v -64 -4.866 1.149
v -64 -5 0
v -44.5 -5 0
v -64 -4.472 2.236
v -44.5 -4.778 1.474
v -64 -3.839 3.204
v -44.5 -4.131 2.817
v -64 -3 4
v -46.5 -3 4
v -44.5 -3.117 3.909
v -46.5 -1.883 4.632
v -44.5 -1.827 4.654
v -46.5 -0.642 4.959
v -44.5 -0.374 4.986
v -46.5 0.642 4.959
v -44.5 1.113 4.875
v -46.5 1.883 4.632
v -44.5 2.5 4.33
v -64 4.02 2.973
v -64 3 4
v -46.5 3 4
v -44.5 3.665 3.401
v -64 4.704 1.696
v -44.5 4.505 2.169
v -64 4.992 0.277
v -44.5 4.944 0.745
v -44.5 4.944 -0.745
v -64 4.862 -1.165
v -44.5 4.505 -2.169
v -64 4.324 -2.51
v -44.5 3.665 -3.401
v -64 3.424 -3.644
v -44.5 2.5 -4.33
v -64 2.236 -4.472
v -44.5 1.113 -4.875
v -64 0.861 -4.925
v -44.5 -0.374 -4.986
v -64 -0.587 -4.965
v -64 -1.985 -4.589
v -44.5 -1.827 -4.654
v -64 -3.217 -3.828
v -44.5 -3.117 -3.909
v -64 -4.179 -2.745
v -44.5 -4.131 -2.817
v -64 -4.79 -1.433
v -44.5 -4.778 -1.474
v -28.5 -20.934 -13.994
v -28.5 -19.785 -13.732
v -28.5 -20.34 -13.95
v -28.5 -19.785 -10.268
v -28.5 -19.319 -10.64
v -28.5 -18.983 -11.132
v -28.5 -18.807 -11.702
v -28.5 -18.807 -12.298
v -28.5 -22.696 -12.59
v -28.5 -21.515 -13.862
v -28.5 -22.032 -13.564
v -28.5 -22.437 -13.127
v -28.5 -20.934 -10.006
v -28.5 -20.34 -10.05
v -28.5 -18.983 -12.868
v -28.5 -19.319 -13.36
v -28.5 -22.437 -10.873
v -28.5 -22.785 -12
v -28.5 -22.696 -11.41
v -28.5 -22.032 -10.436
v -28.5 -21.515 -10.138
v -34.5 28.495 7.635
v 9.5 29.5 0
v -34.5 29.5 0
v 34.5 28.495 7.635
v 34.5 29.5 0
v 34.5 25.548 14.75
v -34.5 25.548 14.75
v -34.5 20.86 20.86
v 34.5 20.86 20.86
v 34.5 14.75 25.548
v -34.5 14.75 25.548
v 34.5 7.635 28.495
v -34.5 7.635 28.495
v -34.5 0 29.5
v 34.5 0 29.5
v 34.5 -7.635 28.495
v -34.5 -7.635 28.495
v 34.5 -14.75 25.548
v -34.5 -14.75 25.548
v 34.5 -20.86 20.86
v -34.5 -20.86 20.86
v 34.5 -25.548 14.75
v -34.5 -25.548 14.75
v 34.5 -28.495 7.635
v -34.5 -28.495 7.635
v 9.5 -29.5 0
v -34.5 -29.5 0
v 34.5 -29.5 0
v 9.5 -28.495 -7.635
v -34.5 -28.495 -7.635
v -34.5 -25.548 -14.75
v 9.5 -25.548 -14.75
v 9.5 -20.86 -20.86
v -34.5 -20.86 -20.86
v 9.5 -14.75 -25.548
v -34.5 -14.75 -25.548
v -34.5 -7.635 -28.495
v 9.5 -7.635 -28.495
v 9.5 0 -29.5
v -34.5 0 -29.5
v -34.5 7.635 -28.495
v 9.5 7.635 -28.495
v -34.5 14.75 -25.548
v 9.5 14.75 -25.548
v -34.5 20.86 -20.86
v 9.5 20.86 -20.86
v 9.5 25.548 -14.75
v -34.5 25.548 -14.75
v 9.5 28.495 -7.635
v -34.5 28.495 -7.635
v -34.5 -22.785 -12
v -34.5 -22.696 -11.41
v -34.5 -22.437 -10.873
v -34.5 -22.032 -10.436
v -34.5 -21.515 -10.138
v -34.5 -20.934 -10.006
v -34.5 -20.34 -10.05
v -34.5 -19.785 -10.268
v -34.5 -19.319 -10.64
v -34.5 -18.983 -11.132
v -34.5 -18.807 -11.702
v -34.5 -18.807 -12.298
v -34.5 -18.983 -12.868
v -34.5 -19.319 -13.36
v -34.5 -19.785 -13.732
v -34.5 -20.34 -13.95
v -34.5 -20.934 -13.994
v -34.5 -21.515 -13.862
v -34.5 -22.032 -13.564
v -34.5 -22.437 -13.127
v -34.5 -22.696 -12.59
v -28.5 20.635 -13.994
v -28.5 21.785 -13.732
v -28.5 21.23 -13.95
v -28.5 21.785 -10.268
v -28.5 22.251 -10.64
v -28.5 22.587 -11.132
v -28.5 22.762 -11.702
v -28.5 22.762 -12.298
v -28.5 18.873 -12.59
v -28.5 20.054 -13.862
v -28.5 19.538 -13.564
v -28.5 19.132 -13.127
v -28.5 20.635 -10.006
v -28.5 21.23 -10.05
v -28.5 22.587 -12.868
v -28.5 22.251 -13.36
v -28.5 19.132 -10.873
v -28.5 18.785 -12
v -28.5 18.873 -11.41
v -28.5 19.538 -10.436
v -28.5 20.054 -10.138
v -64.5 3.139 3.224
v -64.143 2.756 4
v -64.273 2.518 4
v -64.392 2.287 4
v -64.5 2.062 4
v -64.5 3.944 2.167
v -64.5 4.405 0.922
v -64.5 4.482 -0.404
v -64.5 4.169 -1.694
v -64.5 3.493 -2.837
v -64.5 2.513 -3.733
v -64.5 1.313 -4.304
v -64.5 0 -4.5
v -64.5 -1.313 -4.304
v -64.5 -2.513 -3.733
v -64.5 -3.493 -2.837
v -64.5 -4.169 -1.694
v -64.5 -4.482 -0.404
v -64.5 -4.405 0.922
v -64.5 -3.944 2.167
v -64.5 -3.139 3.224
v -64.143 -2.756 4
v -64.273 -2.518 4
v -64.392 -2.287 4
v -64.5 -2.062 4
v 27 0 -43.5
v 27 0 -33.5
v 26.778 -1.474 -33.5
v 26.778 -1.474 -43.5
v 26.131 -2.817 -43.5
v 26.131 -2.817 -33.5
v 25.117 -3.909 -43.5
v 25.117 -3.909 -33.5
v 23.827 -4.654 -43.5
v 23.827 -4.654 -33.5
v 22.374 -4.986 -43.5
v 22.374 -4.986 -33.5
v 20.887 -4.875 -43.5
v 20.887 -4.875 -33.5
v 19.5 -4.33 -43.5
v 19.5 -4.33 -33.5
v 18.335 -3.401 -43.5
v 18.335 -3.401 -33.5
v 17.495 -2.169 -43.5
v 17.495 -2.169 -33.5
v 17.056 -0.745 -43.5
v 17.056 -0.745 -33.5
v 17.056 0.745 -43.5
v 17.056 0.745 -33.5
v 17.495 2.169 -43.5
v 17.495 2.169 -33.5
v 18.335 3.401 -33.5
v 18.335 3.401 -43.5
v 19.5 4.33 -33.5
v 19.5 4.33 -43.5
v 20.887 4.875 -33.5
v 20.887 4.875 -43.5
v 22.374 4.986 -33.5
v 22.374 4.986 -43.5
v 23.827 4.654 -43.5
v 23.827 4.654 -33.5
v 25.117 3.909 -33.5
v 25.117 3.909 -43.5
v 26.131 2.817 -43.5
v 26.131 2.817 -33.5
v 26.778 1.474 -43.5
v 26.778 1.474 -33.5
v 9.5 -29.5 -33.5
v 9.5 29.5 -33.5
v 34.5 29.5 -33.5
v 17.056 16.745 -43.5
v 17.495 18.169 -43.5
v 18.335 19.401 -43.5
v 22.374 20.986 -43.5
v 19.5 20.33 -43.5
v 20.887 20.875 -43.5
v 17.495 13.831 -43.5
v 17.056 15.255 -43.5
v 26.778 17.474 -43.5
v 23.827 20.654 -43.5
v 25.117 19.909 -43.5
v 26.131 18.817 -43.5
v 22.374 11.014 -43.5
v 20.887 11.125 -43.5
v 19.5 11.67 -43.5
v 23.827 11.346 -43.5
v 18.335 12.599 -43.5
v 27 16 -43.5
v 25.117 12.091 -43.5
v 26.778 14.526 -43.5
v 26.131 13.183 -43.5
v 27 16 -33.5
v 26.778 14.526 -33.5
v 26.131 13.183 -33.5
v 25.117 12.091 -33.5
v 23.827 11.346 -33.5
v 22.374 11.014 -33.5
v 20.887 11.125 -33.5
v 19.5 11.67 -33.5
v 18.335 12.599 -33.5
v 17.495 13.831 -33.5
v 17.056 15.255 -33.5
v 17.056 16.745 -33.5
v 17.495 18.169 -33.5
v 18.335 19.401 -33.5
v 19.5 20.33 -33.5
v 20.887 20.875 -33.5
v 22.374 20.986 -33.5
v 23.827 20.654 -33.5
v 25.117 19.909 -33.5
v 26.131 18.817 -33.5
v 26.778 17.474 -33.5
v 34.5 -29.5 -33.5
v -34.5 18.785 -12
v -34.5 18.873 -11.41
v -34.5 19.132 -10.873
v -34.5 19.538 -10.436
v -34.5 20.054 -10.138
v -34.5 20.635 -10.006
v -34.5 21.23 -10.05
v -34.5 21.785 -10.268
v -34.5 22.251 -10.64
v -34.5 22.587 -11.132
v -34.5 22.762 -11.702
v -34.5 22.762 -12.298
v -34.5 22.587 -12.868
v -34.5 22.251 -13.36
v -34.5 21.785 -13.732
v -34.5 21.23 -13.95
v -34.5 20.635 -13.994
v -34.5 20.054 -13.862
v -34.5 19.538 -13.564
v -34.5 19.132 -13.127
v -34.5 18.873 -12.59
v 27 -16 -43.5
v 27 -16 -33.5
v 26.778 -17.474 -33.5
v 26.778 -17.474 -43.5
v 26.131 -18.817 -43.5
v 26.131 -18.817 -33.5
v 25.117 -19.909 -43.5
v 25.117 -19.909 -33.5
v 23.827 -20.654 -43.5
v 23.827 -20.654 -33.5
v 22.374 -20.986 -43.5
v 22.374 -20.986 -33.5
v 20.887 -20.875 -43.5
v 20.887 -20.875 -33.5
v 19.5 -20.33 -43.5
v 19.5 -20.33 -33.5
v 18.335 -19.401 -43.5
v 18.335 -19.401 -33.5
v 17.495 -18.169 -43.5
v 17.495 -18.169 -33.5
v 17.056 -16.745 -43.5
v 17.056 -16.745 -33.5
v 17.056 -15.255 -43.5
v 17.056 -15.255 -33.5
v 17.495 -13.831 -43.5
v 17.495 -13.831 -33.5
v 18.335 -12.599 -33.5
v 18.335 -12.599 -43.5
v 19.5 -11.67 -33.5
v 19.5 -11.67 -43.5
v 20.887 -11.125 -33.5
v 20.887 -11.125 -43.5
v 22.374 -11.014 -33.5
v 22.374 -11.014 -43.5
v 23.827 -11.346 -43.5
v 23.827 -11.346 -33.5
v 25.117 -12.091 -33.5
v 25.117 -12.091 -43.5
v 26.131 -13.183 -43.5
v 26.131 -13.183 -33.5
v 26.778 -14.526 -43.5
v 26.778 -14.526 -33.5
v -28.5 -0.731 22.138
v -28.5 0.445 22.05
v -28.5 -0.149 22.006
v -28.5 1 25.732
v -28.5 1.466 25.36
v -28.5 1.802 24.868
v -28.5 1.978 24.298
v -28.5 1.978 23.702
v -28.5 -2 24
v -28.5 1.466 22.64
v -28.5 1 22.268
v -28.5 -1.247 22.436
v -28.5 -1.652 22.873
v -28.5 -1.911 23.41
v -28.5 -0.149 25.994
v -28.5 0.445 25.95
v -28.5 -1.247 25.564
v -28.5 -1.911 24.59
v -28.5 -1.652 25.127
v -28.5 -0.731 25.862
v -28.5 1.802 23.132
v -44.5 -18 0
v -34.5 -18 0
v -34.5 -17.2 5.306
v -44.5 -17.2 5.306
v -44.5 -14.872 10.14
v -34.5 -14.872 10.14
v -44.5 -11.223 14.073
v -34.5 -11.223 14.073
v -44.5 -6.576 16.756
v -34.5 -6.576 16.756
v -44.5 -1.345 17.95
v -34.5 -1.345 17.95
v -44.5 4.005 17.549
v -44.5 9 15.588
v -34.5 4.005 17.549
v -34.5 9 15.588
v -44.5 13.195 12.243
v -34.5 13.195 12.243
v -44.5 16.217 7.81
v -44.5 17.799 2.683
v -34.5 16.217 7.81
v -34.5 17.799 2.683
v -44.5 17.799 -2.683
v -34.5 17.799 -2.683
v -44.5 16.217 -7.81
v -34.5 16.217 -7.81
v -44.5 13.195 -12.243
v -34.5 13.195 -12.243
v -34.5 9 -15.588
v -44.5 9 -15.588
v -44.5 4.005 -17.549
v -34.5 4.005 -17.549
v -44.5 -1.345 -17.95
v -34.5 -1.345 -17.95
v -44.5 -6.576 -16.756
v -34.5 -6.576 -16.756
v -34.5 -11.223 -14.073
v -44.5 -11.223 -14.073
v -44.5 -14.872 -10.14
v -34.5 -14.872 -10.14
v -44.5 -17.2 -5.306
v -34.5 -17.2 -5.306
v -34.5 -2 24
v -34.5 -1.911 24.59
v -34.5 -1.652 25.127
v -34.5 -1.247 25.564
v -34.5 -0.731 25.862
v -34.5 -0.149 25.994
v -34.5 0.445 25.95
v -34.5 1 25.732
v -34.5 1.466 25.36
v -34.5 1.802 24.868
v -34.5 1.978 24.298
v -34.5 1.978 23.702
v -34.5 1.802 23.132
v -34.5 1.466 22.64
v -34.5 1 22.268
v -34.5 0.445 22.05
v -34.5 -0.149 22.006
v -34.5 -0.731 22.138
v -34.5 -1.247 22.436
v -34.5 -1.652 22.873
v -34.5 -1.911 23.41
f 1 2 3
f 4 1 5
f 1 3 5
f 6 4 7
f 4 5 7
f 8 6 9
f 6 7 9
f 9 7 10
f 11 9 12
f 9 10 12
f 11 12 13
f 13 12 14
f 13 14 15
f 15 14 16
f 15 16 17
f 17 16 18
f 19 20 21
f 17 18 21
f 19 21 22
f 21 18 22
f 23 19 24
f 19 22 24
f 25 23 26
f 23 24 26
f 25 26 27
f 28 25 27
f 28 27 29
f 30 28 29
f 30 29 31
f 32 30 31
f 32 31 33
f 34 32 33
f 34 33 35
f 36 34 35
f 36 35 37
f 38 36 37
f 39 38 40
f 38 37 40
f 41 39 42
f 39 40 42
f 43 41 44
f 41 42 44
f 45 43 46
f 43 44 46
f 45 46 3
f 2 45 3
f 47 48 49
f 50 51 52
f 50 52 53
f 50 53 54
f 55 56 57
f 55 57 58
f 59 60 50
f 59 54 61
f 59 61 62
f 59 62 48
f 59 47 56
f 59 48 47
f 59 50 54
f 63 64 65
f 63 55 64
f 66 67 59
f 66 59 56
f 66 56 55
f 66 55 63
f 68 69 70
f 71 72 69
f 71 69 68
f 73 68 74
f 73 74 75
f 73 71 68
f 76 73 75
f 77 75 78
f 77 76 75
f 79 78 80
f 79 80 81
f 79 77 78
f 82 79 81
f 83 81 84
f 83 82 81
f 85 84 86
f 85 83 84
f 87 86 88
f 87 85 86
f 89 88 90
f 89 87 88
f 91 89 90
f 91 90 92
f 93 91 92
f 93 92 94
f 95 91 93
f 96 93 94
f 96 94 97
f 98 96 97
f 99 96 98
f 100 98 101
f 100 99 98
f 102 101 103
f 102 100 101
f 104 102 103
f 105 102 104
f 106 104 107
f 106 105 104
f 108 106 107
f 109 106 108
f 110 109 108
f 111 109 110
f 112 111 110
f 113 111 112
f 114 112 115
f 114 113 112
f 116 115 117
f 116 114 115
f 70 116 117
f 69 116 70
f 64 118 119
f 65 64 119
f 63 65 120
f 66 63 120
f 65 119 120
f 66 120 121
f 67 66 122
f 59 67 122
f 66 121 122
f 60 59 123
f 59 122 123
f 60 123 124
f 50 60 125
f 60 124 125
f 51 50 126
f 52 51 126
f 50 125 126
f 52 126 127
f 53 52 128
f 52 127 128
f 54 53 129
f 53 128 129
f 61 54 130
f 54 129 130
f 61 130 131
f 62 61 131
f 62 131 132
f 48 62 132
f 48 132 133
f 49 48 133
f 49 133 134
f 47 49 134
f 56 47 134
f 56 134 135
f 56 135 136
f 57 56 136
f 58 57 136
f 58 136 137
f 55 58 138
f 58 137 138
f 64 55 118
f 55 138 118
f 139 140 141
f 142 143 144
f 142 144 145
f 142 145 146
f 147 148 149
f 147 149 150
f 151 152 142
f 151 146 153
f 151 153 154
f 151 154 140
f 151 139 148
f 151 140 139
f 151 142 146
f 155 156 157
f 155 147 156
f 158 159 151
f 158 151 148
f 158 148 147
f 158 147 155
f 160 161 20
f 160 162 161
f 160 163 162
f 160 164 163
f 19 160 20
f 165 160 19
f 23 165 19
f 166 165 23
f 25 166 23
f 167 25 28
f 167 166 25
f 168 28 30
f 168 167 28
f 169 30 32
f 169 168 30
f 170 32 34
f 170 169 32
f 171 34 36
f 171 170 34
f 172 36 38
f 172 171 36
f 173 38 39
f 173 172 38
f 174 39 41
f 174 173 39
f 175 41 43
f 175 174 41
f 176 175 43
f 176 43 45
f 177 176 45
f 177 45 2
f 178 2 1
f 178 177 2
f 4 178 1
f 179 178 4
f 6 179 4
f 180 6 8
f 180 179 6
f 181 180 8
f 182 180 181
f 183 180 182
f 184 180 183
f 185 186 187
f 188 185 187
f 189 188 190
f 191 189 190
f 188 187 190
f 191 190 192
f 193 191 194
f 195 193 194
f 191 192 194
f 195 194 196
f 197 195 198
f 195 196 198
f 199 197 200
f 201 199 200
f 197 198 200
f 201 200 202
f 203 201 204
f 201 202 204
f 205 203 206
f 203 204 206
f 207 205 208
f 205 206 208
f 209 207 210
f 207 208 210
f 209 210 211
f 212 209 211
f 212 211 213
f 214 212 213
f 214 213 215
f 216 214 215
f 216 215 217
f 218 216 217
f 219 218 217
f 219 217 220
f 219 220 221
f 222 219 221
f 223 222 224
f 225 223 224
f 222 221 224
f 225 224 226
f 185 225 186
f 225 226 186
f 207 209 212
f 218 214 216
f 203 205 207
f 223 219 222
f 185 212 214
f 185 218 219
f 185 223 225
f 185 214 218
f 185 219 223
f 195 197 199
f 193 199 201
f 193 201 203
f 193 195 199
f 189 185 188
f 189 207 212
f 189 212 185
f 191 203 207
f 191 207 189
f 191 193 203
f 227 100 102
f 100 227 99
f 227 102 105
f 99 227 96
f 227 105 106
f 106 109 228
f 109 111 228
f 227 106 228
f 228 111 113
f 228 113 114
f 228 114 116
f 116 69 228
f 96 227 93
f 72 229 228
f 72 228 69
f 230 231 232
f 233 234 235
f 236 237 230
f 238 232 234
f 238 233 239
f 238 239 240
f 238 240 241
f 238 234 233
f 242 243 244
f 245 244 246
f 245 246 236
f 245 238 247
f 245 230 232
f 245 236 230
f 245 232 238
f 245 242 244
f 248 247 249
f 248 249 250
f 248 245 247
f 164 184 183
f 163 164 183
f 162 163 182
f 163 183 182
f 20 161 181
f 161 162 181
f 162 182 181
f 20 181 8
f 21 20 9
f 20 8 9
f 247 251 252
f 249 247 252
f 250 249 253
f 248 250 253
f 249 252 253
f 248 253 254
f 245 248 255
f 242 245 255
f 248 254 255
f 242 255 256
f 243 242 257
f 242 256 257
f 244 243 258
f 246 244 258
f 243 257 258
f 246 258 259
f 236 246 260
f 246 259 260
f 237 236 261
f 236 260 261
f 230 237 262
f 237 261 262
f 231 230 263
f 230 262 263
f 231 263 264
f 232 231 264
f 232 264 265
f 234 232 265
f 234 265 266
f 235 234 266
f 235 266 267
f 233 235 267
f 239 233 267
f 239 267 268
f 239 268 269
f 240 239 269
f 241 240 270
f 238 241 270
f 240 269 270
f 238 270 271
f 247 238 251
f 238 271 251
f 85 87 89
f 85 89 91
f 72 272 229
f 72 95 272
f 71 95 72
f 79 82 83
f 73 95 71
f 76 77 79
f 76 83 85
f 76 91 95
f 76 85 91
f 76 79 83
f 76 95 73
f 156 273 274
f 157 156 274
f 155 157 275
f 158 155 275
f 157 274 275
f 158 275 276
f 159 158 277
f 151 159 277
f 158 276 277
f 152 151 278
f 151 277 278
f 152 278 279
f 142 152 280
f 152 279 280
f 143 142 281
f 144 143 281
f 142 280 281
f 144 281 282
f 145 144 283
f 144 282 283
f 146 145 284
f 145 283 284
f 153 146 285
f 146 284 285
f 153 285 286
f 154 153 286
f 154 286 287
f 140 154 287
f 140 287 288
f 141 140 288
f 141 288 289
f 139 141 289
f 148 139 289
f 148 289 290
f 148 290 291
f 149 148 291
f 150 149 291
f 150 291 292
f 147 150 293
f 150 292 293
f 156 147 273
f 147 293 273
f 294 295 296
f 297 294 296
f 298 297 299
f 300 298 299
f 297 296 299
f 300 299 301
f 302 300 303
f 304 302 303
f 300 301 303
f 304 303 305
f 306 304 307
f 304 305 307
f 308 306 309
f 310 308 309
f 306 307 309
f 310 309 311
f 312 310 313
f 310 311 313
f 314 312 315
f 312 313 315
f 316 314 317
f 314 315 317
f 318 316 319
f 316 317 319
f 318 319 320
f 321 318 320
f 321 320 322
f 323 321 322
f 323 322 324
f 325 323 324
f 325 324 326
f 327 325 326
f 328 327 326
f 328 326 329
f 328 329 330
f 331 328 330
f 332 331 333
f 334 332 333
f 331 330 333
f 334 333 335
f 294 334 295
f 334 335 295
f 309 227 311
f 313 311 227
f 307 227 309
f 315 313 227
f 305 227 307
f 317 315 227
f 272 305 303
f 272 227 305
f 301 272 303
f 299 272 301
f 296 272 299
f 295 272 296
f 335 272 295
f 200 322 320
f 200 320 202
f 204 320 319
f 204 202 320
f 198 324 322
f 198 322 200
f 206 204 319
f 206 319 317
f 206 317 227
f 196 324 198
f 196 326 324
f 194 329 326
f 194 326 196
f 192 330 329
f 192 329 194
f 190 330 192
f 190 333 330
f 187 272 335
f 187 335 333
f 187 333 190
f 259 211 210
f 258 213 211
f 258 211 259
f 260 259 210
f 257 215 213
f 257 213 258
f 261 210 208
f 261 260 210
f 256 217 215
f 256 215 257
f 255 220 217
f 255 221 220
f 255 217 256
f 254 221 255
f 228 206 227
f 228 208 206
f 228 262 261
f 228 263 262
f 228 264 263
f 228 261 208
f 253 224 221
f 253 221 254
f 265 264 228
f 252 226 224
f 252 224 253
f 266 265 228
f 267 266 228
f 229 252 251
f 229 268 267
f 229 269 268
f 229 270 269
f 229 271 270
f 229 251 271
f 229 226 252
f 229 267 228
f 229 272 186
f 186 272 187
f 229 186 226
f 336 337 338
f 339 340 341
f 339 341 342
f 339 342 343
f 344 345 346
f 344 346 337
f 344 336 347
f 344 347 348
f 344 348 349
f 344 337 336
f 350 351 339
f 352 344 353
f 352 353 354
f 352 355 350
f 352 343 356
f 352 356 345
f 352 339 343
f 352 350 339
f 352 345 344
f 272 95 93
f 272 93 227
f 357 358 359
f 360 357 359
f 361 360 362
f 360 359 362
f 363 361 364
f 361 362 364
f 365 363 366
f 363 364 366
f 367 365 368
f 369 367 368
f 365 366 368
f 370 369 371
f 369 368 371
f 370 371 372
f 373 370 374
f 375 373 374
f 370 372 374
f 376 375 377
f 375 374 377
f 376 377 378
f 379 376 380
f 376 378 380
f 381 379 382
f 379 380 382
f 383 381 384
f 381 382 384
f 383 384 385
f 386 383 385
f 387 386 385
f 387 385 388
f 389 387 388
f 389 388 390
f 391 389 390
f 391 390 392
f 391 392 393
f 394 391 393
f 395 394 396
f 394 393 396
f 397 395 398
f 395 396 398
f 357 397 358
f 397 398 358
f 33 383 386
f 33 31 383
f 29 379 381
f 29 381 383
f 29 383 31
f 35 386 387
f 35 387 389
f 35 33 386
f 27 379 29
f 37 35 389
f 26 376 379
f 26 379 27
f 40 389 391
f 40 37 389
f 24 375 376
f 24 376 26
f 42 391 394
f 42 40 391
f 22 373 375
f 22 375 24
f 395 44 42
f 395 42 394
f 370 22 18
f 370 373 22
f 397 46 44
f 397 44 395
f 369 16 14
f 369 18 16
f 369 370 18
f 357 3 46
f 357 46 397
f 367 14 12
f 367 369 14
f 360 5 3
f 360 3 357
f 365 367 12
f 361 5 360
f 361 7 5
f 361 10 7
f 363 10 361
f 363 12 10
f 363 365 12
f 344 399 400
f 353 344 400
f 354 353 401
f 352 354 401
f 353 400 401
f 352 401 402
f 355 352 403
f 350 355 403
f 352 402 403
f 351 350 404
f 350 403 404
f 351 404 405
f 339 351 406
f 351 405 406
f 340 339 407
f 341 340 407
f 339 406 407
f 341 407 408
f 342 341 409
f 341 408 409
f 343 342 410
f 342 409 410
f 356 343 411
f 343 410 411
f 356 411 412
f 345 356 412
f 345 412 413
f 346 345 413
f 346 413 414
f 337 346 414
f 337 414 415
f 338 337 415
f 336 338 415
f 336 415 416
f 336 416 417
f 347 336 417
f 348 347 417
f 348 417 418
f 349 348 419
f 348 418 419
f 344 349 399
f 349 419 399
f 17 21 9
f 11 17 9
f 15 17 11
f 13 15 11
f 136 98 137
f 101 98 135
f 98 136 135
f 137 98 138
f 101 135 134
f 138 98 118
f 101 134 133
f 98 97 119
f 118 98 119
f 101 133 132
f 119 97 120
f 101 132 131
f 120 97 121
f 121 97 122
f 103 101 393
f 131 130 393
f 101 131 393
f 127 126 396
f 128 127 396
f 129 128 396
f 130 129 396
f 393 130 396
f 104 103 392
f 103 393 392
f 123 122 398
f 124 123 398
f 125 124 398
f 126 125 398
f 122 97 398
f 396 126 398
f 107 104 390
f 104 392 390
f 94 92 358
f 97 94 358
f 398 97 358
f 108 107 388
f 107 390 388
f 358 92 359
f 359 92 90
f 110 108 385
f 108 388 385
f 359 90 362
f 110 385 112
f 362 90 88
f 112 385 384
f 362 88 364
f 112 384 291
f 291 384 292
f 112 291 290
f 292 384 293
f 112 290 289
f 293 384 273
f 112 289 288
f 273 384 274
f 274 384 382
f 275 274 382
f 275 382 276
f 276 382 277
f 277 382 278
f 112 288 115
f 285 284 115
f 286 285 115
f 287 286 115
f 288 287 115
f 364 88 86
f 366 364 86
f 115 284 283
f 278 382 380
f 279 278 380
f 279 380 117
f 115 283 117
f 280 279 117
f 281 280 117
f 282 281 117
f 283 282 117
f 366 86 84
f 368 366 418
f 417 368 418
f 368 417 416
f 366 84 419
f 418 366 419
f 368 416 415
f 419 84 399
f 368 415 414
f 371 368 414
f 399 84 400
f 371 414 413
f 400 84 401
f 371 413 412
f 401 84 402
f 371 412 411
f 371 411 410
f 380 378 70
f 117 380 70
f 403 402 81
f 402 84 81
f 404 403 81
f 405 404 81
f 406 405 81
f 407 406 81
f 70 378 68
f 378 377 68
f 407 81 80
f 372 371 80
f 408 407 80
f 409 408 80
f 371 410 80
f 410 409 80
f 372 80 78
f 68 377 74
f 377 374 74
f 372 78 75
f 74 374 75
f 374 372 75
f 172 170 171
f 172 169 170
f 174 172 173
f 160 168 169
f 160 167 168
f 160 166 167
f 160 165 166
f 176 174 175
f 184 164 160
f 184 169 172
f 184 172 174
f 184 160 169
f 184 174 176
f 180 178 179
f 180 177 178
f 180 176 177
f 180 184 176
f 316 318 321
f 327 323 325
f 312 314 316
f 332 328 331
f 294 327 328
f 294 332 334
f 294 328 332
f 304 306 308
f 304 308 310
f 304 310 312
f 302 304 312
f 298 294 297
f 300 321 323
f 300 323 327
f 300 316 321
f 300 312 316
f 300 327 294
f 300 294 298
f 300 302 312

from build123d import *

# Parameters (mm, degrees)
F0_R      = 29.5
F1_DEPTH  = 34.5
F2_R      = 18
F3_DEPTH  = 10
F4_R      = 5
F5_DEPTH  = 20
F7_DEPTH  = 25
F8_R      = 5
F9_DEPTH  = 10
F10_R     = 2
F11_DEPTH = 6
F12_W     = 18
F12_H     = 1
F13_DEPTH = 12.5
F14_SIZE  = 0.5


with BuildPart() as f1:
    # F0 (on Right) → F1 (new body, symmetric)
    with BuildSketch(Plane.YZ):
        Circle(F0_R)
    extrude(amount=F1_DEPTH, both=True)

    # F2 (on face) → F3 (join)
    with BuildSketch(Plane(origin=(-34.5, 0, 0), x_dir=(0, -1, 0), z_dir=(-1, 0, 0))):
        Circle(F2_R)
    extrude(amount=F3_DEPTH)

    # F4 (on face) → F5 (join)
    with BuildSketch(Plane(origin=(-44.5, 0, 0), x_dir=(0, -1, 0), z_dir=(-1, 0, 0))):
        Circle(F4_R)
    extrude(amount=F5_DEPTH)

    # F6 (on face) → F7 (join)
    with BuildSketch(Plane.YZ.offset(34.5)):
        with BuildLine():
            Line((29.5, -33.5), (29.5, 0))
            ThreePointArc((29.5, 0), (0, 29.5), (-29.5, 0))
            Line((-29.5, 0), (-29.5, -33.5))
            Line((-29.5, -33.5), (29.5, -33.5))
        make_face()
    extrude(amount=-F7_DEPTH)

    # F8 (on face) → F9 (join)
    with BuildSketch(Plane(origin=(0, 0, -33.5), x_dir=(1, 0, 0), z_dir=(0, 0, -1))):
        with Locations((22, 16)):
            Circle(F8_R)
        with Locations((22, 0)):
            Circle(F8_R)
        with Locations((22, -16)):
            Circle(F8_R)
    extrude(amount=F9_DEPTH)

    # F10 (on face) → F11 (cut)
    with BuildSketch(Plane(origin=(-34.5, 0, 0), x_dir=(0, -1, 0), z_dir=(-1, 0, 0))):
        with Locations((-20.78461, -12)):
            Circle(F10_R)
        with Locations((0, 24)):
            Circle(F10_R)
        with Locations((20.78461, -12)):
            Circle(F10_R)
    extrude(amount=-F11_DEPTH, mode=Mode.SUBTRACT)

    # F12 (on Front) → F13 (cut, symmetric)
    with BuildSketch(Plane.XZ):
        with Locations((-55.5, 4.5)):
            Rectangle(F12_W, F12_H)
    extrude(amount=F13_DEPTH, both=True, mode=Mode.SUBTRACT)

    # F14
    f14_edges = [f1.edges().sort_by_distance(p)[0] for p in [
        (-64.5, 2.236068, -4.472136),
    ]]
    chamfer(f14_edges, length=F14_SIZE)


solid = f1.part
